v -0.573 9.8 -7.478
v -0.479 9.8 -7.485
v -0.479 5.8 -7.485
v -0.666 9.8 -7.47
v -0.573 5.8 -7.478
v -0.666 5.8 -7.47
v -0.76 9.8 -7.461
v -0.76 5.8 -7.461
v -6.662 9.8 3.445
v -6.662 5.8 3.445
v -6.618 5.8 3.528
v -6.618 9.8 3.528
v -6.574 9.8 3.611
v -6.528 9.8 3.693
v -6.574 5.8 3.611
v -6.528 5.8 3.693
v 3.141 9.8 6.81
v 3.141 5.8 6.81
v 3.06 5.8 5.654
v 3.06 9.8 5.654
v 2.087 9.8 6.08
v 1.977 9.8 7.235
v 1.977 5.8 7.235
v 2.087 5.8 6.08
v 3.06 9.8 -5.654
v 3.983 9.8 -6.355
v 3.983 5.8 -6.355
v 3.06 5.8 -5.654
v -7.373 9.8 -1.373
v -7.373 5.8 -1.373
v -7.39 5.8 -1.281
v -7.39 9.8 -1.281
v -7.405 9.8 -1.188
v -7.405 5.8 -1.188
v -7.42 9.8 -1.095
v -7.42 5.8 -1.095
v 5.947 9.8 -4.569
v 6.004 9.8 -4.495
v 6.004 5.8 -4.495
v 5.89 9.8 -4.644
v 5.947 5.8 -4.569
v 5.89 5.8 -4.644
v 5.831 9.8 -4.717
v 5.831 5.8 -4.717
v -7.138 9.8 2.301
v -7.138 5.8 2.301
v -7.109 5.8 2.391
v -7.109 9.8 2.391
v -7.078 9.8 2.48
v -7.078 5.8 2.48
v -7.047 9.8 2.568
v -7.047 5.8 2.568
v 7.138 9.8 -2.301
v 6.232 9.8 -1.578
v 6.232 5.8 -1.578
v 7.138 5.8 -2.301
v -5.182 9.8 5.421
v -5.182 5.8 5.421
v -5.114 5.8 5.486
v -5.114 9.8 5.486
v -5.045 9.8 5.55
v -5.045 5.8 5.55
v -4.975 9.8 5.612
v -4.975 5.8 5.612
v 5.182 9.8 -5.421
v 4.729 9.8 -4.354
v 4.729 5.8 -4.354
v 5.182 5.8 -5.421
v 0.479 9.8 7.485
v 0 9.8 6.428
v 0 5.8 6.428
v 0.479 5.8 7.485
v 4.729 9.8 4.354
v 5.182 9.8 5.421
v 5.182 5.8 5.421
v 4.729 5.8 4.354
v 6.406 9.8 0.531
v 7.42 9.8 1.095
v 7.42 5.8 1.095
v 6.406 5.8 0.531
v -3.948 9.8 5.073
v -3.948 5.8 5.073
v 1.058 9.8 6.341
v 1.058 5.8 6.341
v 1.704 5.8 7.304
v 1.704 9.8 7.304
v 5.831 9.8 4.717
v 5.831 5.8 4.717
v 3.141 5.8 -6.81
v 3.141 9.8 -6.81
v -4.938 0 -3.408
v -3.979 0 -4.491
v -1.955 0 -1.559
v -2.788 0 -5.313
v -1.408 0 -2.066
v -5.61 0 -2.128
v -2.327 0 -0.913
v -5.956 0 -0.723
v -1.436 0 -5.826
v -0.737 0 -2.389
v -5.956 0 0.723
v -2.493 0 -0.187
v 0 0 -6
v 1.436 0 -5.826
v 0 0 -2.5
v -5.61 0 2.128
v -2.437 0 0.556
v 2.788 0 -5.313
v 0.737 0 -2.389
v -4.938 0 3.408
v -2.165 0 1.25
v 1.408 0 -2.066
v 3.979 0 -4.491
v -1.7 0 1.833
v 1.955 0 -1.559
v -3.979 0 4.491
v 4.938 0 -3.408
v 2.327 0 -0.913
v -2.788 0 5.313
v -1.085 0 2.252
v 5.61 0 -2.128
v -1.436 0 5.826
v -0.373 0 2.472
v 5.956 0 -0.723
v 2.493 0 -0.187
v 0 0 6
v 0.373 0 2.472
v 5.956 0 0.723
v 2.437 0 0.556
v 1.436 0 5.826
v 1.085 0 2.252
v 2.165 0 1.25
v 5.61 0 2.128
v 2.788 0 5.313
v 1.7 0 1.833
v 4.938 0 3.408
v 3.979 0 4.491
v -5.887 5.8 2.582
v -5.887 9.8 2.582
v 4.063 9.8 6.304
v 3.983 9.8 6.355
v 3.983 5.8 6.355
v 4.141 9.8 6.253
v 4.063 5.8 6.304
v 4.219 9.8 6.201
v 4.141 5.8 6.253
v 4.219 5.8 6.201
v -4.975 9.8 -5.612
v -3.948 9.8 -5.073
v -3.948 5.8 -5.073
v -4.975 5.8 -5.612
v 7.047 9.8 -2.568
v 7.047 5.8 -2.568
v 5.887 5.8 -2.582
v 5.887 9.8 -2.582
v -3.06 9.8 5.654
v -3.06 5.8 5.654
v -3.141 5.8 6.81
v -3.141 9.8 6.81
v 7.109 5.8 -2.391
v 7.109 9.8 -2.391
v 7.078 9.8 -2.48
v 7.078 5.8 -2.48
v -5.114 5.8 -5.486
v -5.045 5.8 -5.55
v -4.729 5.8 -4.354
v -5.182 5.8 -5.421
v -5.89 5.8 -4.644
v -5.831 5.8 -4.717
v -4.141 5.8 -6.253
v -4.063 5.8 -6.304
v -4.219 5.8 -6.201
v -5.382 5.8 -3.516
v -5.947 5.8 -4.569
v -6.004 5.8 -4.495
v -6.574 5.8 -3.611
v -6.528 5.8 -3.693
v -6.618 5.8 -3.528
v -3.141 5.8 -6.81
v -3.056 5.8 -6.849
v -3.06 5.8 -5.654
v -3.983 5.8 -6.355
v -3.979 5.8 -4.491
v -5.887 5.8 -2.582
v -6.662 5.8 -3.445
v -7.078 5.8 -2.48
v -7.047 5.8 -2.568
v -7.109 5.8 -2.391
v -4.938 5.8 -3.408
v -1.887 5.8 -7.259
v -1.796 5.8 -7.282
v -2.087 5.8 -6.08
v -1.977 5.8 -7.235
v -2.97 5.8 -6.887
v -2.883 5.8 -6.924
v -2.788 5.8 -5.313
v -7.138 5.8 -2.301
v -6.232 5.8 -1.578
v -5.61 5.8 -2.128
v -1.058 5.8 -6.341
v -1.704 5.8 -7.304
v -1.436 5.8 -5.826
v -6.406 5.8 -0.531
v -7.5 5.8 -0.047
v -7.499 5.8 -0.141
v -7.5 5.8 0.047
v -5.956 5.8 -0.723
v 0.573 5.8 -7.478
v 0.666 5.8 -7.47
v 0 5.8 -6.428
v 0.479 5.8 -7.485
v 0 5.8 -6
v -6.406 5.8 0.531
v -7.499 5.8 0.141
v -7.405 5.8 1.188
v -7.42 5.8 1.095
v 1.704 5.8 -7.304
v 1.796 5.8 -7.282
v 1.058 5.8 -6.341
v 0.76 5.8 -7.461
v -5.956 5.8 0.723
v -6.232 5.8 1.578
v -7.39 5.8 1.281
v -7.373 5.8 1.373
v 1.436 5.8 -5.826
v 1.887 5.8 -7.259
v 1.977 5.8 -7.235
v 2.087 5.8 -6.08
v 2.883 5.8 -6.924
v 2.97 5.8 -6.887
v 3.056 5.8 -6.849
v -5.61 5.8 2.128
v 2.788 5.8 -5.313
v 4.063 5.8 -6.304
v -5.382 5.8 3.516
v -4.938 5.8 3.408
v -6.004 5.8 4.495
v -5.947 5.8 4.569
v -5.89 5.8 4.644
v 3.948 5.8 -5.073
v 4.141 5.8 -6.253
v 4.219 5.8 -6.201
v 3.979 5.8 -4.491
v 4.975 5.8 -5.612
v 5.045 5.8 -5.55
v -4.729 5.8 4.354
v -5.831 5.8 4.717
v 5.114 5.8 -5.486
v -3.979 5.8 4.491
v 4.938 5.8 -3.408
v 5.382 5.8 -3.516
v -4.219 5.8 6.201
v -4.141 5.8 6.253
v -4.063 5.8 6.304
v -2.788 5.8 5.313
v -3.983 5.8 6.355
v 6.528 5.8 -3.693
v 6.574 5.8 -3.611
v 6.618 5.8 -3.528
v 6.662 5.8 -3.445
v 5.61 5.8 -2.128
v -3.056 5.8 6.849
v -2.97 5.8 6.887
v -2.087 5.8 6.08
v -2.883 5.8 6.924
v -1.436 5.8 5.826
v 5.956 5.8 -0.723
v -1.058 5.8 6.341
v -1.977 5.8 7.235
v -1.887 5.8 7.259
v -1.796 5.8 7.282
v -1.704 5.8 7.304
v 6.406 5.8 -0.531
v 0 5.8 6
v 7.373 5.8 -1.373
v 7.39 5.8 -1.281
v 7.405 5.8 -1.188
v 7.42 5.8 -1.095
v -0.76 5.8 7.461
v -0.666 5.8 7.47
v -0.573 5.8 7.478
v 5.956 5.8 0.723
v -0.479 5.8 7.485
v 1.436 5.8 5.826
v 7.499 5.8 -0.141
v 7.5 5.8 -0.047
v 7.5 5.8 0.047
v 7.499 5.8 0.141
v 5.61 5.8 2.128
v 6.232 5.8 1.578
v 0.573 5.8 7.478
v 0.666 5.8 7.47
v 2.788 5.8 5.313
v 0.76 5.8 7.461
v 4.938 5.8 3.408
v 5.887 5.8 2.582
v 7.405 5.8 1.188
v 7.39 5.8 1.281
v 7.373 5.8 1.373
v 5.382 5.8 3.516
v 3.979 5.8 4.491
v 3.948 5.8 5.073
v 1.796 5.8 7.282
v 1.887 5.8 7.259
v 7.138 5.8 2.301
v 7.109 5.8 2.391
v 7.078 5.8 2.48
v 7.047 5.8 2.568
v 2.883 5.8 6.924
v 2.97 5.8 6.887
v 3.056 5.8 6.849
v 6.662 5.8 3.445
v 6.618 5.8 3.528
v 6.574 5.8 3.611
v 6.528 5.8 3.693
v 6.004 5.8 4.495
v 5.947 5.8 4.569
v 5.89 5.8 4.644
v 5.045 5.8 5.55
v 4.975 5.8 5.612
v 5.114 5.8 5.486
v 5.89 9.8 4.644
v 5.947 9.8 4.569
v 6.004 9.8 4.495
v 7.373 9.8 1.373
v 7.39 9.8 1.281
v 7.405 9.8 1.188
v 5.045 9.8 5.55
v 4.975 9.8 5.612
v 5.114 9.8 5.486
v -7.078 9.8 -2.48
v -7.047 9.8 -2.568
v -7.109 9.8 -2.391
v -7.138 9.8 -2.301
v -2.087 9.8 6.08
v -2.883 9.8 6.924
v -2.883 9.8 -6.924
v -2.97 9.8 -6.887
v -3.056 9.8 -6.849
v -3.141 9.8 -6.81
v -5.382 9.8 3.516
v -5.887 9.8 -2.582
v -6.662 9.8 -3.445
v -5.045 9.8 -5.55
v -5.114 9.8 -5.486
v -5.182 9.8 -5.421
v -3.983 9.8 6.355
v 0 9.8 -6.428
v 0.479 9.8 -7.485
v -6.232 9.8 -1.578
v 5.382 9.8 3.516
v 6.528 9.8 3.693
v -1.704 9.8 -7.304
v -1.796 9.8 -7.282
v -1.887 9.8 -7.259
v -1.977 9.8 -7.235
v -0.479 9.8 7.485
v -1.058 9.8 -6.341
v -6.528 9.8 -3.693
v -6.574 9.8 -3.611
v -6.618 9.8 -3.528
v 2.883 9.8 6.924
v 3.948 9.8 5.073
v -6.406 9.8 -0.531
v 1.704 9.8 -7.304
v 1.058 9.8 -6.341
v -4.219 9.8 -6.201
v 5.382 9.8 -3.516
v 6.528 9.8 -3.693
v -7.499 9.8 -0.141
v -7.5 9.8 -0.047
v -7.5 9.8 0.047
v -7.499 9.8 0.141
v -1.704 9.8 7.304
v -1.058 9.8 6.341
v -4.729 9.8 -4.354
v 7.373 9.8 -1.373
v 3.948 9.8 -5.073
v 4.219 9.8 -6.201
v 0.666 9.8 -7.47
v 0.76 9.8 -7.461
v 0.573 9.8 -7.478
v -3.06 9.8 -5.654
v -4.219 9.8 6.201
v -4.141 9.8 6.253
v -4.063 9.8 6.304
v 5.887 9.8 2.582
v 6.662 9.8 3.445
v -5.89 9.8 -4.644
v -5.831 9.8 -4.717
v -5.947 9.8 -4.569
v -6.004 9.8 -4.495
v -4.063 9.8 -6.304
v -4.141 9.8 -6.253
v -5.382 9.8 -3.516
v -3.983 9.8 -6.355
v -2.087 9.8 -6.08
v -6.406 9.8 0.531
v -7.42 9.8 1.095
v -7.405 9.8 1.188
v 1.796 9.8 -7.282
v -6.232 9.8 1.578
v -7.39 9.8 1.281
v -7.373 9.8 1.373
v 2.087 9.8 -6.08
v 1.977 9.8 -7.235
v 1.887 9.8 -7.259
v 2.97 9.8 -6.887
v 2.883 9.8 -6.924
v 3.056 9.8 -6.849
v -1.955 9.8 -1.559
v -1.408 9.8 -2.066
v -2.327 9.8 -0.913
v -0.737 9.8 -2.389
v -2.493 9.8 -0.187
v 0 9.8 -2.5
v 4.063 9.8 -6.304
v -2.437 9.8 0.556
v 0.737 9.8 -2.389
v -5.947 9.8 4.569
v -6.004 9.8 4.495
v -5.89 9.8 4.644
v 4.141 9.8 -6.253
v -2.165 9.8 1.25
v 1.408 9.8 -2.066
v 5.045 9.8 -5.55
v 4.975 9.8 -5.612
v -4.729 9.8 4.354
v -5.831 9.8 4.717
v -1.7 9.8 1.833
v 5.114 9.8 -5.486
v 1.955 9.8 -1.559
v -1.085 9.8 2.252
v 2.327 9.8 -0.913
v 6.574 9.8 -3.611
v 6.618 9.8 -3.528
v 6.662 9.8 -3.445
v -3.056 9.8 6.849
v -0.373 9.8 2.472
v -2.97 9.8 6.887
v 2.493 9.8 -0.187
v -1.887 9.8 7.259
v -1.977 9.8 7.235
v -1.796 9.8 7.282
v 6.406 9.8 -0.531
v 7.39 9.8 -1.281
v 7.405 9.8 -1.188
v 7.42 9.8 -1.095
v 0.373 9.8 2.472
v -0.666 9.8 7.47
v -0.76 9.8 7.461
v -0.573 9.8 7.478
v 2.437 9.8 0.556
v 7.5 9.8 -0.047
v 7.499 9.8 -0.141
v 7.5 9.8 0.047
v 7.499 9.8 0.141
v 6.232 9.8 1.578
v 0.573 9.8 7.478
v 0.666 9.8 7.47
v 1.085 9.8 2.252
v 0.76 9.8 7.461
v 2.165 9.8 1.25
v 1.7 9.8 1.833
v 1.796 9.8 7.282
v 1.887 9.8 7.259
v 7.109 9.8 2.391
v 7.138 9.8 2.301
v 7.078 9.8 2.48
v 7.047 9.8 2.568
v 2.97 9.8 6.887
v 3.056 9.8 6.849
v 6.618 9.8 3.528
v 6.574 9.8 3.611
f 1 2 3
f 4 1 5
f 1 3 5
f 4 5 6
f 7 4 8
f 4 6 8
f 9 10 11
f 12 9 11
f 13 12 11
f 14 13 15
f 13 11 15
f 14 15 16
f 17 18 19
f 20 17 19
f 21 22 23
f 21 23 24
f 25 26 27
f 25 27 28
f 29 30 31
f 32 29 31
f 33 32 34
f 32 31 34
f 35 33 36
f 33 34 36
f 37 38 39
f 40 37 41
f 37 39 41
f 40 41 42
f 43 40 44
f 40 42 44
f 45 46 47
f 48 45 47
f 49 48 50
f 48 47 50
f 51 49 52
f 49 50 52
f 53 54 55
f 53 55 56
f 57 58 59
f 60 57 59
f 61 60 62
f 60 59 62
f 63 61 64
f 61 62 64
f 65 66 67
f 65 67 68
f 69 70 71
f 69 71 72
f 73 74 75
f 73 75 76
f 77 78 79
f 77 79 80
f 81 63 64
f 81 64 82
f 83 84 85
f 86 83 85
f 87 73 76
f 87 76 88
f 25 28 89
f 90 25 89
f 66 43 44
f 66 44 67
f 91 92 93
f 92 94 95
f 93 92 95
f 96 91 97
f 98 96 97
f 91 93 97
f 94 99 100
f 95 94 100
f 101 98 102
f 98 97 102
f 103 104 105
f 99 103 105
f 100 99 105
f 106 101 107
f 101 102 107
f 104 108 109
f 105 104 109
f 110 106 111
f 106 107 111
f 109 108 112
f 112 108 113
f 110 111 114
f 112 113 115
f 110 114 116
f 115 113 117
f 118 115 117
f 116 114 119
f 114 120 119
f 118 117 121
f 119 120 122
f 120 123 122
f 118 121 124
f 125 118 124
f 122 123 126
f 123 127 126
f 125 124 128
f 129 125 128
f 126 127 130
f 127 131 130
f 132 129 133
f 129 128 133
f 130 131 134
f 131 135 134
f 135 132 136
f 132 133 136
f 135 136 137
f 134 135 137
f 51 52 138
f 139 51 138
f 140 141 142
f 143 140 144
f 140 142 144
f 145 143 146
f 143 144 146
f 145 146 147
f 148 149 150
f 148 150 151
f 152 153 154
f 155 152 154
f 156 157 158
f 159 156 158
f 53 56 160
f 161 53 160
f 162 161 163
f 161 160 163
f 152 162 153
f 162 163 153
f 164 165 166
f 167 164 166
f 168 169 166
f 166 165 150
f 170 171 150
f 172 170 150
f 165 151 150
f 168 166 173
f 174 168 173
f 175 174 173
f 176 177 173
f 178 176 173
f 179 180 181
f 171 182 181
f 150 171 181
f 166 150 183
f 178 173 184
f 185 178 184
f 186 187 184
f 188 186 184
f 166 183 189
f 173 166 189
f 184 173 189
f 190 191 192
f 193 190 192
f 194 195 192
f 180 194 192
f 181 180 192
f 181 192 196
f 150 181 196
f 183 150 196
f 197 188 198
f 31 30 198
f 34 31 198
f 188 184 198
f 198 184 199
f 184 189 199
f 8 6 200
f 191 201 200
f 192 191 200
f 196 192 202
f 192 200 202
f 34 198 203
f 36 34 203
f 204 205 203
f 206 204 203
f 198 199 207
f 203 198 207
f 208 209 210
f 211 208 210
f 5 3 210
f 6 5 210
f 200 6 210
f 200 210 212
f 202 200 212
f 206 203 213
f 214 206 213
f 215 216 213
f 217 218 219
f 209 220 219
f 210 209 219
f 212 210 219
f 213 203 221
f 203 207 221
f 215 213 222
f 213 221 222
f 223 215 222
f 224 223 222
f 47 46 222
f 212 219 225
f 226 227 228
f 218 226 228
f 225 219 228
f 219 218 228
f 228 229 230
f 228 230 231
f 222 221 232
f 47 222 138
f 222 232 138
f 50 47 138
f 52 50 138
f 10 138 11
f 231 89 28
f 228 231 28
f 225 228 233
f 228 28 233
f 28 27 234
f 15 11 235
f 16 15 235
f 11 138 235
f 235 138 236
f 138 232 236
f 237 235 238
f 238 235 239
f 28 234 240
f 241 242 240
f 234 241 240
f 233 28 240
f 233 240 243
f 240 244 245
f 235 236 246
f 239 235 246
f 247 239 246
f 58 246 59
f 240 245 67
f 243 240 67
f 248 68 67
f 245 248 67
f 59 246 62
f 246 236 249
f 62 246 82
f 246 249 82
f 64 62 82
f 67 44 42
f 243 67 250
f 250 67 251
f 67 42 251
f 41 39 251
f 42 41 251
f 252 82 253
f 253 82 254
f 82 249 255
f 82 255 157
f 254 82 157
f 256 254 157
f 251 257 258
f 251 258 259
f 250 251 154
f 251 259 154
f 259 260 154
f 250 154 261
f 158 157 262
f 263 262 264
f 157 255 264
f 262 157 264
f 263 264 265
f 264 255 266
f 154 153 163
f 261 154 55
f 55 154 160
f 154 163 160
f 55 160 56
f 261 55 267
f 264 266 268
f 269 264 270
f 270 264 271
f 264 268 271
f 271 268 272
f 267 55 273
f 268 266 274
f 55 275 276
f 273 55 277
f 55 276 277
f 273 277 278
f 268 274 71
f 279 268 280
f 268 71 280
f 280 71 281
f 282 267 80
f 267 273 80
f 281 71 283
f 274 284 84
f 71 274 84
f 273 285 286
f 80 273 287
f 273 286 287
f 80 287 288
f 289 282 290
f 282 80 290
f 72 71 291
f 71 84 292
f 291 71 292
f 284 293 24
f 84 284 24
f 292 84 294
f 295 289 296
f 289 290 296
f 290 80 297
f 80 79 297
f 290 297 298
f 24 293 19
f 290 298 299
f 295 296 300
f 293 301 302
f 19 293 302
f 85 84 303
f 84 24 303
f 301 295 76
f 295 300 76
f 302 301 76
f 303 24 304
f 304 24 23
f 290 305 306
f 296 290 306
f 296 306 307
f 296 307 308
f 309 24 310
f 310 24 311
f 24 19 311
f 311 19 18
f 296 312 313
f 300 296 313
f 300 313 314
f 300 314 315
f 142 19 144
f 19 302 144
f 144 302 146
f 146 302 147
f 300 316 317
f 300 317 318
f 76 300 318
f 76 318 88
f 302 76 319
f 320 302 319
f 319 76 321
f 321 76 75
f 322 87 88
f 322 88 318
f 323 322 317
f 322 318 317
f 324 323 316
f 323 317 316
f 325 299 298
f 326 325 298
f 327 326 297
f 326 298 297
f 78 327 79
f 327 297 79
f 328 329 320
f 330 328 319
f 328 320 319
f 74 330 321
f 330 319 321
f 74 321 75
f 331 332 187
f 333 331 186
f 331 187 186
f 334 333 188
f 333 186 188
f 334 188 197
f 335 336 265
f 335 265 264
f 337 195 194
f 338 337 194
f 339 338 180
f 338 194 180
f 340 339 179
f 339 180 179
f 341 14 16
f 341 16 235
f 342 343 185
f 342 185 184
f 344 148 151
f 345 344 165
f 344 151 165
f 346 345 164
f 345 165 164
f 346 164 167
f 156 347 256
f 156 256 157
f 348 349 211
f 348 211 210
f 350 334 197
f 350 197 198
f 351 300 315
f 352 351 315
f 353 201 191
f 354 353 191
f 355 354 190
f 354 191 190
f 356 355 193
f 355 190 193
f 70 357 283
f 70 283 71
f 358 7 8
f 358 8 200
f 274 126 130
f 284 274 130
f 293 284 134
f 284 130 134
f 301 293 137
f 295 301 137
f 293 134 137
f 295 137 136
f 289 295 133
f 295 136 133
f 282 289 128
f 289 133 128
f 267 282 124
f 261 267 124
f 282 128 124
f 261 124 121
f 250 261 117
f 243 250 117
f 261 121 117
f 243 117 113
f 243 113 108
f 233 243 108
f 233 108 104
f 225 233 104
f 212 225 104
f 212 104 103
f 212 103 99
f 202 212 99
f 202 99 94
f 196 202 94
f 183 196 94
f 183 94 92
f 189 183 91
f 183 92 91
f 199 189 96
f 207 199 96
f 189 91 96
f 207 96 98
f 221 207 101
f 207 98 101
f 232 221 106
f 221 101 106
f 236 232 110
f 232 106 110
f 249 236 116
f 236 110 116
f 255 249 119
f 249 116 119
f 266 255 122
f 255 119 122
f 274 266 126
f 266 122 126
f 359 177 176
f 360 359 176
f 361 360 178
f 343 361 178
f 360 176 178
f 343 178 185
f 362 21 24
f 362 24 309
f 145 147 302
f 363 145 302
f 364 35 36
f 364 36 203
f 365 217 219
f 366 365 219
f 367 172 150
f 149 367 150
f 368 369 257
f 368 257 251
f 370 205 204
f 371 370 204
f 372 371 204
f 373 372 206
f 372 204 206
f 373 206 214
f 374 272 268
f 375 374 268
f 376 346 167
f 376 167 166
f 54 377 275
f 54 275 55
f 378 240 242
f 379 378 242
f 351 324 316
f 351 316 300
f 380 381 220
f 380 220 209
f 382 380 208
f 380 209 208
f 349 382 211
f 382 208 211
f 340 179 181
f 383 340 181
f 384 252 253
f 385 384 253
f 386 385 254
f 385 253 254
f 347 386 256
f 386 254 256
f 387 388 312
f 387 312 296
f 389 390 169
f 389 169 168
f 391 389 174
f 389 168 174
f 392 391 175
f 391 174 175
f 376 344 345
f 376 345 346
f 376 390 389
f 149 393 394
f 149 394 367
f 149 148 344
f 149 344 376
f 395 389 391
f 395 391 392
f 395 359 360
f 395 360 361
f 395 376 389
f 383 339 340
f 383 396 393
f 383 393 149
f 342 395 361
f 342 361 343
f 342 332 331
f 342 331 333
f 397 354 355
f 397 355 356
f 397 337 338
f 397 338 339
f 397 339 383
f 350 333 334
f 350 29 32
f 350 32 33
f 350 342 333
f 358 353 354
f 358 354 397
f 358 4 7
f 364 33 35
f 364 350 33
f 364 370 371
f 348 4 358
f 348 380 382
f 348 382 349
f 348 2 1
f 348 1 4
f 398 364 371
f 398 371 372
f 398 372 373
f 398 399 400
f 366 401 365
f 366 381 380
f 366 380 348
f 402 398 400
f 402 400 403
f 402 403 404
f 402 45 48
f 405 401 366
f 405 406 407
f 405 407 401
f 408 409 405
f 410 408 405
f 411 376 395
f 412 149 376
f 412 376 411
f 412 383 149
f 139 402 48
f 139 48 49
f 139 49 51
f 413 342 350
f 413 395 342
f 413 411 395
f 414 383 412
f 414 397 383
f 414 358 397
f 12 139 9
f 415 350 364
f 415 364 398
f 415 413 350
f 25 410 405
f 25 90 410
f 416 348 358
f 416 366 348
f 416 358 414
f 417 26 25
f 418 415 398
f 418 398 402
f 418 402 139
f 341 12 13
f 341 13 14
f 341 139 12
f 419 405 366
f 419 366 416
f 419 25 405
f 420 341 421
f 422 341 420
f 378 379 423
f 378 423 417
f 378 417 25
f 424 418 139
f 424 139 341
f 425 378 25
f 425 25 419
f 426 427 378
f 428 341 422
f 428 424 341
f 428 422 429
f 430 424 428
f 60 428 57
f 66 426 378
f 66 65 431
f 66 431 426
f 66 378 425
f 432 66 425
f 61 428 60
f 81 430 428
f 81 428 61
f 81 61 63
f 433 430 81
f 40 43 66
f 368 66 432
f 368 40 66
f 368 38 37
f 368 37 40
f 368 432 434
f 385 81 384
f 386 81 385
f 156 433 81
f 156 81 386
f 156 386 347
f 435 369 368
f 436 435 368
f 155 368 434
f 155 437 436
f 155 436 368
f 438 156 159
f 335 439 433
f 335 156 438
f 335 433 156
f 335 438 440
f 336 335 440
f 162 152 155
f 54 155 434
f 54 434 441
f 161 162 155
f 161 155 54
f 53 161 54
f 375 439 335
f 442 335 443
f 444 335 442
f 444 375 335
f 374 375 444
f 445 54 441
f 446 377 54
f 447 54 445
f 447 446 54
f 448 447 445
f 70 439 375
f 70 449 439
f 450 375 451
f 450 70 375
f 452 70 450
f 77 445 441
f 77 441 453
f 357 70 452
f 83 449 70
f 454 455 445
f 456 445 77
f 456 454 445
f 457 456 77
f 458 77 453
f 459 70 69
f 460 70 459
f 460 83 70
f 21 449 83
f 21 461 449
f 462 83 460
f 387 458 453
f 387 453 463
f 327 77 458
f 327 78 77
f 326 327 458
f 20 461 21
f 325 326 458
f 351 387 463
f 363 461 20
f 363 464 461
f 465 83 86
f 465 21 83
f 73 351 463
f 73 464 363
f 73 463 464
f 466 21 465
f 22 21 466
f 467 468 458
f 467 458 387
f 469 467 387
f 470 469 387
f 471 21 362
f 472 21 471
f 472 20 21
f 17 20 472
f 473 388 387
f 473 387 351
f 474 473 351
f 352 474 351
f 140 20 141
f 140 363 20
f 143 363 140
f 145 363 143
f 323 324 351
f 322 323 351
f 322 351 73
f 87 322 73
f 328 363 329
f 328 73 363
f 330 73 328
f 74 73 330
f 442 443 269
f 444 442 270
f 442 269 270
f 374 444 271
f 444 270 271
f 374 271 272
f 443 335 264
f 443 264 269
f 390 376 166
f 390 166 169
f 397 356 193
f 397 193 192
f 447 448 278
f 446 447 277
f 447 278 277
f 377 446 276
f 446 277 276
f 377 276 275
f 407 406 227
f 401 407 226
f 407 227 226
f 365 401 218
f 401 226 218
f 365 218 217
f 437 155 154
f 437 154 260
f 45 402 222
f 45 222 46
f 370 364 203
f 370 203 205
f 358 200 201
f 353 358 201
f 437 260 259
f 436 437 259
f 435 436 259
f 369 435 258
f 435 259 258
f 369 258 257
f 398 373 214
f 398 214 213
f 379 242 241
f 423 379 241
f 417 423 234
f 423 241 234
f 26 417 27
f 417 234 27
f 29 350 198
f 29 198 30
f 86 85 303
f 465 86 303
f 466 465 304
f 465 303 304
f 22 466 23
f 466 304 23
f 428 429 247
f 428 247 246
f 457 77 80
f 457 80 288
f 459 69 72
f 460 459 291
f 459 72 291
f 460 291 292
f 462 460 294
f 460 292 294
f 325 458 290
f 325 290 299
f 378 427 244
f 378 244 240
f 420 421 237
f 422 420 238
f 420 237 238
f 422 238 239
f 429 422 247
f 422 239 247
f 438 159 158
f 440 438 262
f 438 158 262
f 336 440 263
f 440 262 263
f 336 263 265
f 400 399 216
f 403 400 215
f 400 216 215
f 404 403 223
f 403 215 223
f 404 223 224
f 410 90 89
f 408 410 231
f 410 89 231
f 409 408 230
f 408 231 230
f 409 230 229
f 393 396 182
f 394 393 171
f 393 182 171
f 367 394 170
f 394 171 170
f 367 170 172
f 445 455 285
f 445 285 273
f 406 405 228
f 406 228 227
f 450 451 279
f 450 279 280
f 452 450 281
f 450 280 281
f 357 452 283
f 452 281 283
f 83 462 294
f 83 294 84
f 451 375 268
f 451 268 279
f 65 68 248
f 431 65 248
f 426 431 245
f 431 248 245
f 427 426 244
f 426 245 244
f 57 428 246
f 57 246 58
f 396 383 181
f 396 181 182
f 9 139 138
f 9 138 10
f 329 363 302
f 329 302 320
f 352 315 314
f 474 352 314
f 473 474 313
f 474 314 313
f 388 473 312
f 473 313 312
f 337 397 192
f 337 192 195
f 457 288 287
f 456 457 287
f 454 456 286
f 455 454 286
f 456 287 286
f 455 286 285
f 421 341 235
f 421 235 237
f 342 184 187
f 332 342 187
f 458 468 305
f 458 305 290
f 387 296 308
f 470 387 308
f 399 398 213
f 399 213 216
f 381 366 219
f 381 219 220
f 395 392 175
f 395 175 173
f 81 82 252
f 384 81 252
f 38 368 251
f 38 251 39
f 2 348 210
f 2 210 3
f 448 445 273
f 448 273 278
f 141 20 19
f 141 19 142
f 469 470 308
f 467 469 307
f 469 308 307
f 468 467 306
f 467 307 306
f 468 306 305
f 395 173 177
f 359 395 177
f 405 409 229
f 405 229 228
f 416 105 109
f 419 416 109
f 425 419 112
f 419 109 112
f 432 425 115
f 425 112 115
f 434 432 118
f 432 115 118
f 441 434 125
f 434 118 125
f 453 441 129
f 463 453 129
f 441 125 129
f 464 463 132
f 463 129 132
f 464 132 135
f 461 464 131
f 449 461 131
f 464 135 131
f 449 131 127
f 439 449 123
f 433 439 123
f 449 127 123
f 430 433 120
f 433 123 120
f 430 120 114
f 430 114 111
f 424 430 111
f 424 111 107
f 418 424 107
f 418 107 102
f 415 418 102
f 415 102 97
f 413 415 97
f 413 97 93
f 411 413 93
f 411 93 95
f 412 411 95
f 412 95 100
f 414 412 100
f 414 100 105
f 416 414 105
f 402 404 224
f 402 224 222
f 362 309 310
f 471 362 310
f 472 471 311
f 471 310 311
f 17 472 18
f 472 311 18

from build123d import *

# Parameters (mm, degrees)
SKETCH_1_R          = 6
EXTRUDE_1_DEPTH     = 5.8
SKETCH_2_R          = 7.5
EXTRUDE_2_DEPTH     = 4
CUT_EXTRUDE_3_DEPTH = 15.440914098
SKETCH_4_R          = 2.5
CUT_EXTRUDE_4_DEPTH = 15.43297622


with BuildPart() as part:
    # Эскиз1 → Вытянуть1 (new body)
    with BuildSketch(Plane(origin=(0, 0, 0), x_dir=(1, 0, 0), z_dir=(0, 1, 0))):
        with Locations(Location((0, 0, 0), (0, 0, 270))):
            Circle(SKETCH_1_R)
    extrude(amount=EXTRUDE_1_DEPTH)

    # Эскиз2 → Вытянуть2 (add)
    with BuildSketch(Plane(origin=(0, 5.8, 0), x_dir=(1, 0, 0), z_dir=(0, 1, 0))):
        with Locations(Location((0, 0, 0), (0, 0, 270))):
            Circle(SKETCH_2_R)
    extrude(amount=EXTRUDE_2_DEPTH)

    # Эскиз3 → Вытянуть3 (cut, through all)
    with BuildSketch(Plane(origin=(0, 9.8, 0), x_dir=(1, 0, 0), z_dir=(0, 1, 0))):
        Polygon((-0.62278932, 7.802539676), (0.62278932, 7.802539676), (0, 6.428342871), align=None)
        Polygon((0.669960535, 7.798630957), (1.898551107, 7.593615451), (1.058070461, 6.340668653), align=None)
        Polygon((1.944435614, 7.581995916), (3.122525368, 7.177557193), (2.087279518, 6.080037523), align=None)
        Polygon((3.165871558, 7.158543791), (4.261325277, 6.565713884), (3.059553031, 5.653558819), align=None)
        Polygon((4.300950779, 6.539825252), (5.283887341, 5.774775016), (3.948369913, 5.072865768), align=None)
        Polygon((5.318711274, 5.742717328), (6.162318733, 4.82631534), (4.729485556, 4.353798163), align=None)
        Polygon((6.19139119, 4.788963046), (6.872658133, 3.746206362), (5.381593163, 3.515970293), align=None)
        Polygon((6.895186095, 3.704578336), (7.395529336, 2.563910641), (5.886904936, 2.582235919), align=None)
        Polygon((7.410898297, 2.519142386), (7.716669776, 1.311678121), (6.231637289, 1.578064881), align=None)
        Polygon((7.724460512, 1.264990798), (7.827319581, 0.023666441), (6.406386821, 0.530848347), align=None)
        Polygon((7.827319581, -0.023666441), (7.724460512, -1.264990798), (6.406386821, -0.530848347), align=None)
        Polygon((7.716669776, -1.311678121), (7.410898297, -2.519142386), (6.231637289, -1.578064881), align=None)
        Polygon((7.395529336, -2.563910641), (6.895186095, -3.704578336), (5.886904936, -2.582235919), align=None)
        Polygon((6.872658133, -3.746206362), (6.19139119, -4.788963046), (5.381593163, -3.515970293), align=None)
        Polygon((6.162318733, -4.82631534), (5.318711274, -5.742717328), (4.729485556, -4.353798163), align=None)
        Polygon((5.283887341, -5.774775016), (4.300950779, -6.539825252), (3.948369913, -5.072865768), align=None)
        Polygon((4.261325277, -6.565713884), (3.165871558, -7.158543791), (3.059553031, -5.653558819), align=None)
        Polygon((3.122525368, -7.177557193), (1.944435614, -7.581995916), (2.087279518, -6.080037523), align=None)
        Polygon((1.898551107, -7.593615451), (0.669960535, -7.798630957), (1.058070461, -6.340668653), align=None)
        Polygon((0.62278932, -7.802539676), (-0.62278932, -7.802539676), (0, -6.428342871), align=None)
        Polygon((-0.669960535, -7.798630957), (-1.898551107, -7.593615451), (-1.058070461, -6.340668653), align=None)
        Polygon((-1.944435614, -7.581995916), (-3.122525368, -7.177557193), (-2.087279518, -6.080037523), align=None)
        Polygon((-3.165871558, -7.158543791), (-4.261325277, -6.565713884), (-3.059553031, -5.653558819), align=None)
        Polygon((-4.300950779, -6.539825252), (-5.283887341, -5.774775016), (-3.948369913, -5.072865768), align=None)
        Polygon((-5.318711274, -5.742717328), (-6.162318733, -4.82631534), (-4.729485556, -4.353798163), align=None)
        Polygon((-6.19139119, -4.788963046), (-6.872658133, -3.746206362), (-5.381593163, -3.515970293), align=None)
        Polygon((-6.895186095, -3.704578336), (-7.395529336, -2.563910641), (-5.886904936, -2.582235919), align=None)
        Polygon((-7.410898297, -2.519142386), (-7.716669776, -1.311678121), (-6.231637289, -1.578064881), align=None)
        Polygon((-7.724460512, -1.264990798), (-7.827319581, -0.023666441), (-6.406386821, -0.530848347), align=None)
        Polygon((-7.827319581, 0.023666441), (-7.724460512, 1.264990798), (-6.406386821, 0.530848347), align=None)
        Polygon((-7.716669776, 1.311678121), (-7.410898297, 2.519142386), (-6.231637289, 1.578064881), align=None)
        Polygon((-7.395529336, 2.563910641), (-6.895186095, 3.704578336), (-5.886904936, 2.582235919), align=None)
        Polygon((-6.872658133, 3.746206362), (-6.19139119, 4.788963046), (-5.381593163, 3.515970293), align=None)
        Polygon((-6.162318733, 4.82631534), (-5.318711274, 5.742717328), (-4.729485556, 4.353798163), align=None)
        Polygon((-5.283887341, 5.774775016), (-4.300950779, 6.539825252), (-3.948369913, 5.072865768), align=None)
        Polygon((-4.261325277, 6.565713884), (-3.165871558, 7.158543791), (-3.059553031, 5.653558819), align=None)
        Polygon((-3.122525368, 7.177557193), (-1.944435614, 7.581995916), (-2.087279518, 6.080037523), align=None)
        Polygon((-1.898551107, 7.593615451), (-0.669960535, 7.798630957), (-1.058070461, 6.340668653), align=None)
    extrude(amount=-CUT_EXTRUDE_3_DEPTH, mode=Mode.SUBTRACT)

    # Эскиз4 → Вытянуть4 (cut, through all)
    with BuildSketch(Plane.XZ):
        with Locations(Location((0, 0, 0), (0, 0, 270))):
            Circle(SKETCH_4_R)
    extrude(amount=-CUT_EXTRUDE_4_DEPTH, mode=Mode.SUBTRACT)


solid = part.part
